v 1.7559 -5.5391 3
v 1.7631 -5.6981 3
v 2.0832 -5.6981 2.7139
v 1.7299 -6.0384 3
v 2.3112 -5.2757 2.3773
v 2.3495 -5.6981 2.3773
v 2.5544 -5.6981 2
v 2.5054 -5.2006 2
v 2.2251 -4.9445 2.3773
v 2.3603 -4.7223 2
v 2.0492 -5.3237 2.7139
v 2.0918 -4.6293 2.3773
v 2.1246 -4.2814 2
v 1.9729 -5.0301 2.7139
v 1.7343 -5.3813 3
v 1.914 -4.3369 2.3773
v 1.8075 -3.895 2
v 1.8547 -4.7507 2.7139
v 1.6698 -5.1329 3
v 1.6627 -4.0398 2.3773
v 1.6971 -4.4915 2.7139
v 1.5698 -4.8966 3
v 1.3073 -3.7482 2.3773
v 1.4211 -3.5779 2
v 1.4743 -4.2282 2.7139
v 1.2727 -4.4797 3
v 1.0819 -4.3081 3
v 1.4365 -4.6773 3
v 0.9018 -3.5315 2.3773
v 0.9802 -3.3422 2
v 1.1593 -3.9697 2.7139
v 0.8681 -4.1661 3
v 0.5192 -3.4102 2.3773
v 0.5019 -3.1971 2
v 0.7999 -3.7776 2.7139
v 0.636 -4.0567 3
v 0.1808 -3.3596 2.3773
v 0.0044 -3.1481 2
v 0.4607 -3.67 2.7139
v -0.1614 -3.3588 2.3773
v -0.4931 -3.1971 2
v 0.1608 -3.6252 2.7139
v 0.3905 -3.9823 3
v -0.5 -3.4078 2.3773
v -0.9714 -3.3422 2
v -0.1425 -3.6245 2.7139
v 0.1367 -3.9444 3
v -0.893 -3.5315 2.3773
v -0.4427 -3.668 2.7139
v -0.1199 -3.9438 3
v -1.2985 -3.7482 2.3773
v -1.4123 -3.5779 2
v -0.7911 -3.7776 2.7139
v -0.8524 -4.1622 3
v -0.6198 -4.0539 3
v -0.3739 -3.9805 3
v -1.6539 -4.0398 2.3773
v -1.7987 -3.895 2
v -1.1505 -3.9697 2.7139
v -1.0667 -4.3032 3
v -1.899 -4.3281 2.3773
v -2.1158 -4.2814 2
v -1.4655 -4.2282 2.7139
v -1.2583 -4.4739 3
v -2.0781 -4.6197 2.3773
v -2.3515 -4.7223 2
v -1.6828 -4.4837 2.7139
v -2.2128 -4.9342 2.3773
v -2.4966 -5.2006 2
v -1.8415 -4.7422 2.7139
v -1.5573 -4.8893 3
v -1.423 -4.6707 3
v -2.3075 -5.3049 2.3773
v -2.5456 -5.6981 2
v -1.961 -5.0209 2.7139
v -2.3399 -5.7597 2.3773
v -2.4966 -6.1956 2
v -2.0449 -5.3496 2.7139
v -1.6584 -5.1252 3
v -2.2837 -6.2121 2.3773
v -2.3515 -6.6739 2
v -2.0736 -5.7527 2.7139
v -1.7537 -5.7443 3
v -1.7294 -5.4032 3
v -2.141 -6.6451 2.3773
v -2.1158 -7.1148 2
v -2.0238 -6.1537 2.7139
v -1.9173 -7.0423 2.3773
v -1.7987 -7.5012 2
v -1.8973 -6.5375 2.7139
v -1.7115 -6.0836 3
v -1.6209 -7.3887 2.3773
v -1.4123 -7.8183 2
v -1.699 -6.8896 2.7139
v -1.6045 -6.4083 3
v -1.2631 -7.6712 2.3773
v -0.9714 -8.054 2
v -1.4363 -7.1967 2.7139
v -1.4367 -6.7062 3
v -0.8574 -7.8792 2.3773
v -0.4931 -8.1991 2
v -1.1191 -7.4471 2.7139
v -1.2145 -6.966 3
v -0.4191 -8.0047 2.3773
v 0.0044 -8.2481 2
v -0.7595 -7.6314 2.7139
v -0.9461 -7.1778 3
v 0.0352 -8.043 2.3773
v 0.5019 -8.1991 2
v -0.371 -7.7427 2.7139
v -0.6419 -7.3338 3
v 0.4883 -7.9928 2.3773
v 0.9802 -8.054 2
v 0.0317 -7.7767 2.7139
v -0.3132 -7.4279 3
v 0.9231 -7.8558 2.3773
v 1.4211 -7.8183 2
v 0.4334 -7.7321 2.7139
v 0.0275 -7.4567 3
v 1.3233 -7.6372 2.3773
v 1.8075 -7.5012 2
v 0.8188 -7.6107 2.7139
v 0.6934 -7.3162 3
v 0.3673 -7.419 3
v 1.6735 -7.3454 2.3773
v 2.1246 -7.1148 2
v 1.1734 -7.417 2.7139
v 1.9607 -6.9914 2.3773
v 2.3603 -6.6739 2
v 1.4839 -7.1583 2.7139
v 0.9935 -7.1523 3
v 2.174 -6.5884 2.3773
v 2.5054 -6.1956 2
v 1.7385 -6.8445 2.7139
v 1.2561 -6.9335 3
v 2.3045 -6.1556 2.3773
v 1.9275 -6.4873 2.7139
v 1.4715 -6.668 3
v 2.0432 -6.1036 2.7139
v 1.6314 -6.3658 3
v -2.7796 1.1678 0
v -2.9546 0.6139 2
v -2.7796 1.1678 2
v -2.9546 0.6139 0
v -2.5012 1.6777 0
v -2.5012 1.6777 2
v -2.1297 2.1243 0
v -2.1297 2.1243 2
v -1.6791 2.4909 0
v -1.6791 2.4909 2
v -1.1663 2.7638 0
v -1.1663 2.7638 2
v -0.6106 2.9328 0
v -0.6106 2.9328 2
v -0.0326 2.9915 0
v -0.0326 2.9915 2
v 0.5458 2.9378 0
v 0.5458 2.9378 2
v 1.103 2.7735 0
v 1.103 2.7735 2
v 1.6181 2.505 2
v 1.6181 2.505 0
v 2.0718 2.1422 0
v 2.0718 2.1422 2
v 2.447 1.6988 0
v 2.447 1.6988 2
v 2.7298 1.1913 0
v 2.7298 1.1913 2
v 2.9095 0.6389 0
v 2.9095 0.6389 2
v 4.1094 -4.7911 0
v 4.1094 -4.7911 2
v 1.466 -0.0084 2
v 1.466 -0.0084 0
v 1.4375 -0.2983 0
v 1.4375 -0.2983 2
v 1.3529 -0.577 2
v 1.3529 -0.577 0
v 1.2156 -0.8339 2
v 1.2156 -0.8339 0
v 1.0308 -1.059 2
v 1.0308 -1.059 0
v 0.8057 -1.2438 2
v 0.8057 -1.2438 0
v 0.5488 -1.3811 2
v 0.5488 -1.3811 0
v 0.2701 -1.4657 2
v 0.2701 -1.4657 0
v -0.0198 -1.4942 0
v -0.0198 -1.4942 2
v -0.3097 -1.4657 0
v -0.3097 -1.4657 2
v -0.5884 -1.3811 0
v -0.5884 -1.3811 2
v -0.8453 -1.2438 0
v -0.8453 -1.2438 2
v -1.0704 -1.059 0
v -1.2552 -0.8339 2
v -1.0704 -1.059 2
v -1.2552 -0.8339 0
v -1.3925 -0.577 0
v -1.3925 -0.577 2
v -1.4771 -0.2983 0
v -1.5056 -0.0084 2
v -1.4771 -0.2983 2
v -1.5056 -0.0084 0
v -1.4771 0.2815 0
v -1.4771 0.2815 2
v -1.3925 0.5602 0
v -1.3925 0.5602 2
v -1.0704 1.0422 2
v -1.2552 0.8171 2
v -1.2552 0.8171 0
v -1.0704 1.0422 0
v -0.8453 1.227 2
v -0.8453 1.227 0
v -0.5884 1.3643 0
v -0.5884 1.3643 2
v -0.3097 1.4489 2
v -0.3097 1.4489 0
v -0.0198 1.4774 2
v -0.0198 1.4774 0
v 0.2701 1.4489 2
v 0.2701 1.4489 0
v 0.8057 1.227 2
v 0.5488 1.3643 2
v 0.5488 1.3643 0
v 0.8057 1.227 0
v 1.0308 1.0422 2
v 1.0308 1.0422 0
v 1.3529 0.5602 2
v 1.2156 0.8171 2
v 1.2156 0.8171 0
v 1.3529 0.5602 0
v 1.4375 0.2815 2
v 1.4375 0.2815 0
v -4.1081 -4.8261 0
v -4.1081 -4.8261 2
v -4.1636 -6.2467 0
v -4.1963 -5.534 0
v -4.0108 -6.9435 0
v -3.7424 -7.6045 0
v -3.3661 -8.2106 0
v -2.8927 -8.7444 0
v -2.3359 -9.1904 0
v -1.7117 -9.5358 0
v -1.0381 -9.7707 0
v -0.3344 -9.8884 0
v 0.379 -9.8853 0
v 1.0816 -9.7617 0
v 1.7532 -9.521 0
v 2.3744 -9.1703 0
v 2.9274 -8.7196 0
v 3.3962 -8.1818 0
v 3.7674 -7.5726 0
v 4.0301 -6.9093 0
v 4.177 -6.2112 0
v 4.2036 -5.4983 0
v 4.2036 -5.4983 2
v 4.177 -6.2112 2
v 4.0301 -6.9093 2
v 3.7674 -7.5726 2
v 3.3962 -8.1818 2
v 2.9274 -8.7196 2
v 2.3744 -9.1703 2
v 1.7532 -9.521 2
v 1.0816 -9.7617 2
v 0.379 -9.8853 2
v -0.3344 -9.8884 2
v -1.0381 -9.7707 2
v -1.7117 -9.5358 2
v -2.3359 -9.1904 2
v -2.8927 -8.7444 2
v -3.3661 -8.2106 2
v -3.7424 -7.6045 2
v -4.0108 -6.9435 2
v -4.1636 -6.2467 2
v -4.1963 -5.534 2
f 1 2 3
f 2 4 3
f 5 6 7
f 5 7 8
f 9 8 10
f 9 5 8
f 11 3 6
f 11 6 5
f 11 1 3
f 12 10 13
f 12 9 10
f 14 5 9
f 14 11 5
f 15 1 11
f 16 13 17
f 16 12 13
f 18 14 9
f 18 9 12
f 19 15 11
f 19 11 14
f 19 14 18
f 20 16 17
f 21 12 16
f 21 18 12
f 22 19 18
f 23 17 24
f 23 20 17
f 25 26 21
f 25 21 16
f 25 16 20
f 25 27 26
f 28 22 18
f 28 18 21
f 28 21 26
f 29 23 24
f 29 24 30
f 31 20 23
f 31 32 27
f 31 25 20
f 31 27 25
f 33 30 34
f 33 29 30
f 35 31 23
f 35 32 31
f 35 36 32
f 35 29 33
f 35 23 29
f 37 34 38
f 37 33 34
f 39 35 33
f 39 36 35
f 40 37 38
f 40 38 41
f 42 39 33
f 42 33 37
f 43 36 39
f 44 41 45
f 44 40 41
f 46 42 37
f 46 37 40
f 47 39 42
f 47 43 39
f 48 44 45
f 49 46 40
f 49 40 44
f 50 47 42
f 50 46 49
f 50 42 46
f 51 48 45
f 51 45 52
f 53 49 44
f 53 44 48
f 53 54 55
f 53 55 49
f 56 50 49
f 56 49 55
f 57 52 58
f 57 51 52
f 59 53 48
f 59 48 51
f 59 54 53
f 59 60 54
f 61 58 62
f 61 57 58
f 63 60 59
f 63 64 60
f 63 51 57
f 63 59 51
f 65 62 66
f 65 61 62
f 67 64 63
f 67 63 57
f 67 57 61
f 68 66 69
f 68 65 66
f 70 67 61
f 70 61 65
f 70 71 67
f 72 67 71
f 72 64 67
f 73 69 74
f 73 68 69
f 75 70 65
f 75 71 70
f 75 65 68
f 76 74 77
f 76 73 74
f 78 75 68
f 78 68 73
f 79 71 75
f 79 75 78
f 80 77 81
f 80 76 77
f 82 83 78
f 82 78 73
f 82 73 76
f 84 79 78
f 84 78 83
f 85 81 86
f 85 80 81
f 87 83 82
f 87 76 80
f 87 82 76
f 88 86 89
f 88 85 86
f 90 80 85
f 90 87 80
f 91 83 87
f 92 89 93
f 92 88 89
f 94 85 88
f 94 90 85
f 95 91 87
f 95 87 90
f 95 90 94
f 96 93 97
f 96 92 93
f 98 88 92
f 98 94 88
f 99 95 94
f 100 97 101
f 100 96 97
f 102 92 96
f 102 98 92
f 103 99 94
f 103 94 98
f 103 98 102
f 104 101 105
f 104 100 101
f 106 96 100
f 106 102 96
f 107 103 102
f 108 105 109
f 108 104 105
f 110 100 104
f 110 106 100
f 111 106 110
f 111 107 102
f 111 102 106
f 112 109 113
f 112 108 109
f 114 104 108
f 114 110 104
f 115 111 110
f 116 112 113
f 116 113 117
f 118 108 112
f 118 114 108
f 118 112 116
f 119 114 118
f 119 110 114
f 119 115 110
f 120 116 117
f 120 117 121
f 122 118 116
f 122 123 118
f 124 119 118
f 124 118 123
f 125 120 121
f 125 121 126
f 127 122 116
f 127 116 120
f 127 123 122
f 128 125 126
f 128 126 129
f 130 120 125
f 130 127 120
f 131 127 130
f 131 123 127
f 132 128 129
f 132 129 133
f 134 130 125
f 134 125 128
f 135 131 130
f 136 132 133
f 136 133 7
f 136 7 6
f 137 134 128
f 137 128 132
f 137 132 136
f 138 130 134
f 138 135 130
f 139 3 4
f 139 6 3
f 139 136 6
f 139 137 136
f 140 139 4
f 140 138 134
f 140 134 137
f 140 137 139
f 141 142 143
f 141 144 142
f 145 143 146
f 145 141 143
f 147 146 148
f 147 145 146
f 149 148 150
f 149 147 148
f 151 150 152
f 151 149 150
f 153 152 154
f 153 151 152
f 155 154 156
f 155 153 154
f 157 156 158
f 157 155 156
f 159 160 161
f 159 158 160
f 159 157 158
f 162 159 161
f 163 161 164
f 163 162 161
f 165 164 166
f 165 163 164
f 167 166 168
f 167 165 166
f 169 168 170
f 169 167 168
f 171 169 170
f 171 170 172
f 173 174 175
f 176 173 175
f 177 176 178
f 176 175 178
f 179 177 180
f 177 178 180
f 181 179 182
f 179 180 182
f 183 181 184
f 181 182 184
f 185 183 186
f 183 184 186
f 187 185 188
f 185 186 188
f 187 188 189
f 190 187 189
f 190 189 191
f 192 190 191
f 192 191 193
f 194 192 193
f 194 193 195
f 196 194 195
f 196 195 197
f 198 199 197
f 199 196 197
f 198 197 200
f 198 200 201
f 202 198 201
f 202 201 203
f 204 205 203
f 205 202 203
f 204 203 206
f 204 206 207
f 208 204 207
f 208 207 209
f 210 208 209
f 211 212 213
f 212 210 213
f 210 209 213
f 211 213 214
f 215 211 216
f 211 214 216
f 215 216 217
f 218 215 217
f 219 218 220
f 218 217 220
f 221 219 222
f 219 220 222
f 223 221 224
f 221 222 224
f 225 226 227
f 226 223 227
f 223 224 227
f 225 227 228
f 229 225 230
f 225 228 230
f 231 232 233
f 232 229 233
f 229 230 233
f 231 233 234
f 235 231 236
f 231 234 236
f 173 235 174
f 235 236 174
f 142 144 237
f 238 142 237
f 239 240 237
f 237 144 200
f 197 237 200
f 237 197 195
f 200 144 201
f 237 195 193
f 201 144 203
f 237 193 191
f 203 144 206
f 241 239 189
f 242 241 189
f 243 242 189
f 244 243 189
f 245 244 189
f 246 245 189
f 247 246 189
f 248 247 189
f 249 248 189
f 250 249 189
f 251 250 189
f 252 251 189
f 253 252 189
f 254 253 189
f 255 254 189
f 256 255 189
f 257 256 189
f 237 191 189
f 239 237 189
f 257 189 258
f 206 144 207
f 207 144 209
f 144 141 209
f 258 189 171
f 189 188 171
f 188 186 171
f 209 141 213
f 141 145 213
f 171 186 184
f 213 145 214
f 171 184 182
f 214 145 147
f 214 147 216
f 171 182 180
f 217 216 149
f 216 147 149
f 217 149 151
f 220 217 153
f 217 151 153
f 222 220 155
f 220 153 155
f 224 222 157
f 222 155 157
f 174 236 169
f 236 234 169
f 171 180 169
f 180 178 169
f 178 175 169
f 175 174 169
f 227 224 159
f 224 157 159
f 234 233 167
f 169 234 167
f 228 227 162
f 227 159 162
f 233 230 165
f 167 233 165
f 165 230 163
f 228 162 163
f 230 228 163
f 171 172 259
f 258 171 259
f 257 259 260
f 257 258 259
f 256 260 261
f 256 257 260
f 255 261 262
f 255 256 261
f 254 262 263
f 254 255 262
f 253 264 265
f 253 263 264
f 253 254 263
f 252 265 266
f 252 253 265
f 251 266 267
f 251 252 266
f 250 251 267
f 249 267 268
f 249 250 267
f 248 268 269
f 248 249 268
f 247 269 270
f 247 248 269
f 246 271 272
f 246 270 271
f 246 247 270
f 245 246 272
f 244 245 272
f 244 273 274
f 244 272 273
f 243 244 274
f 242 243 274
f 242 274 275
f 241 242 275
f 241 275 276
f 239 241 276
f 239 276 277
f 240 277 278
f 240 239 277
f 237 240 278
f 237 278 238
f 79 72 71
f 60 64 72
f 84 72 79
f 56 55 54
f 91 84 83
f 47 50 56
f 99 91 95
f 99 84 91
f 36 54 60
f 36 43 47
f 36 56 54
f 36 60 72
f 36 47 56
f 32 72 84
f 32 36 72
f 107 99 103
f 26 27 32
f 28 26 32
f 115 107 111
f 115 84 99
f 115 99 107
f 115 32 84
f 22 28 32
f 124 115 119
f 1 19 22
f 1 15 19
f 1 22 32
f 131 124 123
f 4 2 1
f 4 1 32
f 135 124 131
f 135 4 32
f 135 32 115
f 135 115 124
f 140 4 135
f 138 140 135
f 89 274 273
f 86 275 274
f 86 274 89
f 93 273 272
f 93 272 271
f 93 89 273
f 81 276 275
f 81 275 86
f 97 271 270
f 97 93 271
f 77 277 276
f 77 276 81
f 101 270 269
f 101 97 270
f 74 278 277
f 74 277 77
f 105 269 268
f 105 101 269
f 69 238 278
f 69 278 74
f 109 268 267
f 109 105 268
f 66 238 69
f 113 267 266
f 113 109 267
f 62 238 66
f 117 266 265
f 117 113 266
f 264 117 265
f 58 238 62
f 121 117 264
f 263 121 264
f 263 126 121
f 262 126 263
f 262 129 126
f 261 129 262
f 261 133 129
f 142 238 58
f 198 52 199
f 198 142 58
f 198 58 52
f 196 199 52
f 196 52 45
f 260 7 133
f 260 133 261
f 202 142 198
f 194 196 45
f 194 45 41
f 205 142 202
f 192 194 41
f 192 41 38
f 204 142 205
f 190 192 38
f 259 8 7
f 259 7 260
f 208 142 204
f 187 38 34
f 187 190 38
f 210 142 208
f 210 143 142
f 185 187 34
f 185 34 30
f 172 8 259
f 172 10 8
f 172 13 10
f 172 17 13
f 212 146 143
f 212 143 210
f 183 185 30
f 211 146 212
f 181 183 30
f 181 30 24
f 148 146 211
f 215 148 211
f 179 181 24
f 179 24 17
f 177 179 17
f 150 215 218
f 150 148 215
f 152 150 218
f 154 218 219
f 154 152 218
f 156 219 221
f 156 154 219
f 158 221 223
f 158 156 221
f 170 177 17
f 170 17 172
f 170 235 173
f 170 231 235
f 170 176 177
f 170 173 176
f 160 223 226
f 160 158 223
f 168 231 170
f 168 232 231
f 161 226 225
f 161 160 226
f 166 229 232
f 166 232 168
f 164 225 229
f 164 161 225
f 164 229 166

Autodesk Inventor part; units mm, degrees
ref_plane "YZ Plane" through (0, 0, 0) normal (1, 0, 0) x (0, 1, 0)
ref_plane "XZ Plane" through (0, 0, 0) normal (0, 1, 0) x (-1, 0, 0)
ref_plane "XY Plane" through (0, 0, 0) normal (0, 0, 1) x (1, 0, 0)
sketch "Sketch1" plane through (0, 0, 0) normal (0, 0, 1) x (1, 0, 0)
  circle A0 centre (-0.0198, -0.0084) radius 1.4858
  arc A1 (0.0044, -3.1481) -> (0.0044, -8.2481) centre (0.0044, -5.6981) ccw construction
  arc A2 (0.0044, -8.2481) -> (0.0044, -3.1481) centre (0.0044, -5.6981) ccw construction
  line L0 (-5.8056, -3.1481) -> (0.0044, -3.1481) construction
  line L1 (0.0044, -8.2481) -> (-5.8056, -8.2481) construction
  line L2 (2.5544, -5.6981) -> (5.0544, -5.6981) construction
  line L3 (-5.8056, -3.1481) -> (-5.8056, -8.2481) construction
  arc A3 (2.9095, 0.6389) -> (-2.9546, 0.6139) centre (-0.0198, -0.0084) ccw
  arc A4 (-4.1081, -4.8261) -> (4.1094, -4.7911) centre (0.0044, -5.6981) ccw
  line L4 (2.9095, 0.6389) -> (4.1094, -4.7911)
  line L5 (-2.9546, 0.6139) -> (-4.1081, -4.8261)
  point P0 (0, 0)
  dimension "d0" = 2.5
  dimension "d1" = 6
extrude "Extrusion1" add sketch "Sketch1" along normal blind 2
sketch "Sketch2" plane through (0, 0, 2) normal (0, 0, 1) x (1, 0, 0)
  circle A0 centre (-0.0198, -0.0084) radius 1.4858
  arc A1 (0.0044, -3.1481) -> (0.0044, -8.2481) centre (0.0044, -5.6981) ccw construction
  arc A2 (0.0044, -8.2481) -> (0.0044, -3.1481) centre (0.0044, -5.6981) ccw construction
  line L0 (-5.8056, -3.1481) -> (0.0044, -3.1481) construction
  line L1 (0.0044, -8.2481) -> (-5.8056, -8.2481) construction
  line L2 (2.5544, -5.6981) -> (5.0544, -5.6981) construction
  line L3 (-5.8056, -3.1481) -> (-5.8056, -8.2481) construction
  arc A3 (2.9095, 0.6389) -> (-2.9546, 0.6139) centre (-0.0198, -0.0084) ccw
  arc A4 (-4.1081, -4.8261) -> (4.1094, -4.7911) centre (0.0044, -5.6981) ccw
  line L4 (2.9095, 0.6389) -> (4.1094, -4.7911)
  line L5 (-2.9546, 0.6139) -> (-4.1081, -4.8261)
  circle A5 centre (0.0044, -5.6981) radius 2.55
  point P0 (0, 0)
  point P1 (0, 0)
  dimension "d4" = 2.5
  dimension "d5" = 6
extrude "Extrusion2" add sketch "Sketch2" along normal blind 1.5 contours A5
fillet "Fillet1" radius 2.5 1 edges at (-2.5456, -5.6981, 3.5)
sketch "Sketch3" plane through (2.9095, 0.6389, 2) normal (0.9764456, 0.2157637, 0) x (0, 0, -1)
  line L0 (0, 3) -> (0, 0) projected
  line L1 (0, 0) -> (-1, 0)
  line L2 (-1, 0) -> (-1, -8.6875)
  line L3 (-1, -8.6875) -> (-2.9665, -8.6875)
  line L4 (-2.9665, -8.6875) -> (-2.9665, 0)
  line L5 (-2.9665, 0) -> (-1, 0)
  point P0 (2, 0.0039)
  point P1 (0, 1.2408)
  dimension "d9" = 1
extrude "Extrusion3" cut sketch "Sketch3" against normal blind 10
properties part number "Stylis holder"
